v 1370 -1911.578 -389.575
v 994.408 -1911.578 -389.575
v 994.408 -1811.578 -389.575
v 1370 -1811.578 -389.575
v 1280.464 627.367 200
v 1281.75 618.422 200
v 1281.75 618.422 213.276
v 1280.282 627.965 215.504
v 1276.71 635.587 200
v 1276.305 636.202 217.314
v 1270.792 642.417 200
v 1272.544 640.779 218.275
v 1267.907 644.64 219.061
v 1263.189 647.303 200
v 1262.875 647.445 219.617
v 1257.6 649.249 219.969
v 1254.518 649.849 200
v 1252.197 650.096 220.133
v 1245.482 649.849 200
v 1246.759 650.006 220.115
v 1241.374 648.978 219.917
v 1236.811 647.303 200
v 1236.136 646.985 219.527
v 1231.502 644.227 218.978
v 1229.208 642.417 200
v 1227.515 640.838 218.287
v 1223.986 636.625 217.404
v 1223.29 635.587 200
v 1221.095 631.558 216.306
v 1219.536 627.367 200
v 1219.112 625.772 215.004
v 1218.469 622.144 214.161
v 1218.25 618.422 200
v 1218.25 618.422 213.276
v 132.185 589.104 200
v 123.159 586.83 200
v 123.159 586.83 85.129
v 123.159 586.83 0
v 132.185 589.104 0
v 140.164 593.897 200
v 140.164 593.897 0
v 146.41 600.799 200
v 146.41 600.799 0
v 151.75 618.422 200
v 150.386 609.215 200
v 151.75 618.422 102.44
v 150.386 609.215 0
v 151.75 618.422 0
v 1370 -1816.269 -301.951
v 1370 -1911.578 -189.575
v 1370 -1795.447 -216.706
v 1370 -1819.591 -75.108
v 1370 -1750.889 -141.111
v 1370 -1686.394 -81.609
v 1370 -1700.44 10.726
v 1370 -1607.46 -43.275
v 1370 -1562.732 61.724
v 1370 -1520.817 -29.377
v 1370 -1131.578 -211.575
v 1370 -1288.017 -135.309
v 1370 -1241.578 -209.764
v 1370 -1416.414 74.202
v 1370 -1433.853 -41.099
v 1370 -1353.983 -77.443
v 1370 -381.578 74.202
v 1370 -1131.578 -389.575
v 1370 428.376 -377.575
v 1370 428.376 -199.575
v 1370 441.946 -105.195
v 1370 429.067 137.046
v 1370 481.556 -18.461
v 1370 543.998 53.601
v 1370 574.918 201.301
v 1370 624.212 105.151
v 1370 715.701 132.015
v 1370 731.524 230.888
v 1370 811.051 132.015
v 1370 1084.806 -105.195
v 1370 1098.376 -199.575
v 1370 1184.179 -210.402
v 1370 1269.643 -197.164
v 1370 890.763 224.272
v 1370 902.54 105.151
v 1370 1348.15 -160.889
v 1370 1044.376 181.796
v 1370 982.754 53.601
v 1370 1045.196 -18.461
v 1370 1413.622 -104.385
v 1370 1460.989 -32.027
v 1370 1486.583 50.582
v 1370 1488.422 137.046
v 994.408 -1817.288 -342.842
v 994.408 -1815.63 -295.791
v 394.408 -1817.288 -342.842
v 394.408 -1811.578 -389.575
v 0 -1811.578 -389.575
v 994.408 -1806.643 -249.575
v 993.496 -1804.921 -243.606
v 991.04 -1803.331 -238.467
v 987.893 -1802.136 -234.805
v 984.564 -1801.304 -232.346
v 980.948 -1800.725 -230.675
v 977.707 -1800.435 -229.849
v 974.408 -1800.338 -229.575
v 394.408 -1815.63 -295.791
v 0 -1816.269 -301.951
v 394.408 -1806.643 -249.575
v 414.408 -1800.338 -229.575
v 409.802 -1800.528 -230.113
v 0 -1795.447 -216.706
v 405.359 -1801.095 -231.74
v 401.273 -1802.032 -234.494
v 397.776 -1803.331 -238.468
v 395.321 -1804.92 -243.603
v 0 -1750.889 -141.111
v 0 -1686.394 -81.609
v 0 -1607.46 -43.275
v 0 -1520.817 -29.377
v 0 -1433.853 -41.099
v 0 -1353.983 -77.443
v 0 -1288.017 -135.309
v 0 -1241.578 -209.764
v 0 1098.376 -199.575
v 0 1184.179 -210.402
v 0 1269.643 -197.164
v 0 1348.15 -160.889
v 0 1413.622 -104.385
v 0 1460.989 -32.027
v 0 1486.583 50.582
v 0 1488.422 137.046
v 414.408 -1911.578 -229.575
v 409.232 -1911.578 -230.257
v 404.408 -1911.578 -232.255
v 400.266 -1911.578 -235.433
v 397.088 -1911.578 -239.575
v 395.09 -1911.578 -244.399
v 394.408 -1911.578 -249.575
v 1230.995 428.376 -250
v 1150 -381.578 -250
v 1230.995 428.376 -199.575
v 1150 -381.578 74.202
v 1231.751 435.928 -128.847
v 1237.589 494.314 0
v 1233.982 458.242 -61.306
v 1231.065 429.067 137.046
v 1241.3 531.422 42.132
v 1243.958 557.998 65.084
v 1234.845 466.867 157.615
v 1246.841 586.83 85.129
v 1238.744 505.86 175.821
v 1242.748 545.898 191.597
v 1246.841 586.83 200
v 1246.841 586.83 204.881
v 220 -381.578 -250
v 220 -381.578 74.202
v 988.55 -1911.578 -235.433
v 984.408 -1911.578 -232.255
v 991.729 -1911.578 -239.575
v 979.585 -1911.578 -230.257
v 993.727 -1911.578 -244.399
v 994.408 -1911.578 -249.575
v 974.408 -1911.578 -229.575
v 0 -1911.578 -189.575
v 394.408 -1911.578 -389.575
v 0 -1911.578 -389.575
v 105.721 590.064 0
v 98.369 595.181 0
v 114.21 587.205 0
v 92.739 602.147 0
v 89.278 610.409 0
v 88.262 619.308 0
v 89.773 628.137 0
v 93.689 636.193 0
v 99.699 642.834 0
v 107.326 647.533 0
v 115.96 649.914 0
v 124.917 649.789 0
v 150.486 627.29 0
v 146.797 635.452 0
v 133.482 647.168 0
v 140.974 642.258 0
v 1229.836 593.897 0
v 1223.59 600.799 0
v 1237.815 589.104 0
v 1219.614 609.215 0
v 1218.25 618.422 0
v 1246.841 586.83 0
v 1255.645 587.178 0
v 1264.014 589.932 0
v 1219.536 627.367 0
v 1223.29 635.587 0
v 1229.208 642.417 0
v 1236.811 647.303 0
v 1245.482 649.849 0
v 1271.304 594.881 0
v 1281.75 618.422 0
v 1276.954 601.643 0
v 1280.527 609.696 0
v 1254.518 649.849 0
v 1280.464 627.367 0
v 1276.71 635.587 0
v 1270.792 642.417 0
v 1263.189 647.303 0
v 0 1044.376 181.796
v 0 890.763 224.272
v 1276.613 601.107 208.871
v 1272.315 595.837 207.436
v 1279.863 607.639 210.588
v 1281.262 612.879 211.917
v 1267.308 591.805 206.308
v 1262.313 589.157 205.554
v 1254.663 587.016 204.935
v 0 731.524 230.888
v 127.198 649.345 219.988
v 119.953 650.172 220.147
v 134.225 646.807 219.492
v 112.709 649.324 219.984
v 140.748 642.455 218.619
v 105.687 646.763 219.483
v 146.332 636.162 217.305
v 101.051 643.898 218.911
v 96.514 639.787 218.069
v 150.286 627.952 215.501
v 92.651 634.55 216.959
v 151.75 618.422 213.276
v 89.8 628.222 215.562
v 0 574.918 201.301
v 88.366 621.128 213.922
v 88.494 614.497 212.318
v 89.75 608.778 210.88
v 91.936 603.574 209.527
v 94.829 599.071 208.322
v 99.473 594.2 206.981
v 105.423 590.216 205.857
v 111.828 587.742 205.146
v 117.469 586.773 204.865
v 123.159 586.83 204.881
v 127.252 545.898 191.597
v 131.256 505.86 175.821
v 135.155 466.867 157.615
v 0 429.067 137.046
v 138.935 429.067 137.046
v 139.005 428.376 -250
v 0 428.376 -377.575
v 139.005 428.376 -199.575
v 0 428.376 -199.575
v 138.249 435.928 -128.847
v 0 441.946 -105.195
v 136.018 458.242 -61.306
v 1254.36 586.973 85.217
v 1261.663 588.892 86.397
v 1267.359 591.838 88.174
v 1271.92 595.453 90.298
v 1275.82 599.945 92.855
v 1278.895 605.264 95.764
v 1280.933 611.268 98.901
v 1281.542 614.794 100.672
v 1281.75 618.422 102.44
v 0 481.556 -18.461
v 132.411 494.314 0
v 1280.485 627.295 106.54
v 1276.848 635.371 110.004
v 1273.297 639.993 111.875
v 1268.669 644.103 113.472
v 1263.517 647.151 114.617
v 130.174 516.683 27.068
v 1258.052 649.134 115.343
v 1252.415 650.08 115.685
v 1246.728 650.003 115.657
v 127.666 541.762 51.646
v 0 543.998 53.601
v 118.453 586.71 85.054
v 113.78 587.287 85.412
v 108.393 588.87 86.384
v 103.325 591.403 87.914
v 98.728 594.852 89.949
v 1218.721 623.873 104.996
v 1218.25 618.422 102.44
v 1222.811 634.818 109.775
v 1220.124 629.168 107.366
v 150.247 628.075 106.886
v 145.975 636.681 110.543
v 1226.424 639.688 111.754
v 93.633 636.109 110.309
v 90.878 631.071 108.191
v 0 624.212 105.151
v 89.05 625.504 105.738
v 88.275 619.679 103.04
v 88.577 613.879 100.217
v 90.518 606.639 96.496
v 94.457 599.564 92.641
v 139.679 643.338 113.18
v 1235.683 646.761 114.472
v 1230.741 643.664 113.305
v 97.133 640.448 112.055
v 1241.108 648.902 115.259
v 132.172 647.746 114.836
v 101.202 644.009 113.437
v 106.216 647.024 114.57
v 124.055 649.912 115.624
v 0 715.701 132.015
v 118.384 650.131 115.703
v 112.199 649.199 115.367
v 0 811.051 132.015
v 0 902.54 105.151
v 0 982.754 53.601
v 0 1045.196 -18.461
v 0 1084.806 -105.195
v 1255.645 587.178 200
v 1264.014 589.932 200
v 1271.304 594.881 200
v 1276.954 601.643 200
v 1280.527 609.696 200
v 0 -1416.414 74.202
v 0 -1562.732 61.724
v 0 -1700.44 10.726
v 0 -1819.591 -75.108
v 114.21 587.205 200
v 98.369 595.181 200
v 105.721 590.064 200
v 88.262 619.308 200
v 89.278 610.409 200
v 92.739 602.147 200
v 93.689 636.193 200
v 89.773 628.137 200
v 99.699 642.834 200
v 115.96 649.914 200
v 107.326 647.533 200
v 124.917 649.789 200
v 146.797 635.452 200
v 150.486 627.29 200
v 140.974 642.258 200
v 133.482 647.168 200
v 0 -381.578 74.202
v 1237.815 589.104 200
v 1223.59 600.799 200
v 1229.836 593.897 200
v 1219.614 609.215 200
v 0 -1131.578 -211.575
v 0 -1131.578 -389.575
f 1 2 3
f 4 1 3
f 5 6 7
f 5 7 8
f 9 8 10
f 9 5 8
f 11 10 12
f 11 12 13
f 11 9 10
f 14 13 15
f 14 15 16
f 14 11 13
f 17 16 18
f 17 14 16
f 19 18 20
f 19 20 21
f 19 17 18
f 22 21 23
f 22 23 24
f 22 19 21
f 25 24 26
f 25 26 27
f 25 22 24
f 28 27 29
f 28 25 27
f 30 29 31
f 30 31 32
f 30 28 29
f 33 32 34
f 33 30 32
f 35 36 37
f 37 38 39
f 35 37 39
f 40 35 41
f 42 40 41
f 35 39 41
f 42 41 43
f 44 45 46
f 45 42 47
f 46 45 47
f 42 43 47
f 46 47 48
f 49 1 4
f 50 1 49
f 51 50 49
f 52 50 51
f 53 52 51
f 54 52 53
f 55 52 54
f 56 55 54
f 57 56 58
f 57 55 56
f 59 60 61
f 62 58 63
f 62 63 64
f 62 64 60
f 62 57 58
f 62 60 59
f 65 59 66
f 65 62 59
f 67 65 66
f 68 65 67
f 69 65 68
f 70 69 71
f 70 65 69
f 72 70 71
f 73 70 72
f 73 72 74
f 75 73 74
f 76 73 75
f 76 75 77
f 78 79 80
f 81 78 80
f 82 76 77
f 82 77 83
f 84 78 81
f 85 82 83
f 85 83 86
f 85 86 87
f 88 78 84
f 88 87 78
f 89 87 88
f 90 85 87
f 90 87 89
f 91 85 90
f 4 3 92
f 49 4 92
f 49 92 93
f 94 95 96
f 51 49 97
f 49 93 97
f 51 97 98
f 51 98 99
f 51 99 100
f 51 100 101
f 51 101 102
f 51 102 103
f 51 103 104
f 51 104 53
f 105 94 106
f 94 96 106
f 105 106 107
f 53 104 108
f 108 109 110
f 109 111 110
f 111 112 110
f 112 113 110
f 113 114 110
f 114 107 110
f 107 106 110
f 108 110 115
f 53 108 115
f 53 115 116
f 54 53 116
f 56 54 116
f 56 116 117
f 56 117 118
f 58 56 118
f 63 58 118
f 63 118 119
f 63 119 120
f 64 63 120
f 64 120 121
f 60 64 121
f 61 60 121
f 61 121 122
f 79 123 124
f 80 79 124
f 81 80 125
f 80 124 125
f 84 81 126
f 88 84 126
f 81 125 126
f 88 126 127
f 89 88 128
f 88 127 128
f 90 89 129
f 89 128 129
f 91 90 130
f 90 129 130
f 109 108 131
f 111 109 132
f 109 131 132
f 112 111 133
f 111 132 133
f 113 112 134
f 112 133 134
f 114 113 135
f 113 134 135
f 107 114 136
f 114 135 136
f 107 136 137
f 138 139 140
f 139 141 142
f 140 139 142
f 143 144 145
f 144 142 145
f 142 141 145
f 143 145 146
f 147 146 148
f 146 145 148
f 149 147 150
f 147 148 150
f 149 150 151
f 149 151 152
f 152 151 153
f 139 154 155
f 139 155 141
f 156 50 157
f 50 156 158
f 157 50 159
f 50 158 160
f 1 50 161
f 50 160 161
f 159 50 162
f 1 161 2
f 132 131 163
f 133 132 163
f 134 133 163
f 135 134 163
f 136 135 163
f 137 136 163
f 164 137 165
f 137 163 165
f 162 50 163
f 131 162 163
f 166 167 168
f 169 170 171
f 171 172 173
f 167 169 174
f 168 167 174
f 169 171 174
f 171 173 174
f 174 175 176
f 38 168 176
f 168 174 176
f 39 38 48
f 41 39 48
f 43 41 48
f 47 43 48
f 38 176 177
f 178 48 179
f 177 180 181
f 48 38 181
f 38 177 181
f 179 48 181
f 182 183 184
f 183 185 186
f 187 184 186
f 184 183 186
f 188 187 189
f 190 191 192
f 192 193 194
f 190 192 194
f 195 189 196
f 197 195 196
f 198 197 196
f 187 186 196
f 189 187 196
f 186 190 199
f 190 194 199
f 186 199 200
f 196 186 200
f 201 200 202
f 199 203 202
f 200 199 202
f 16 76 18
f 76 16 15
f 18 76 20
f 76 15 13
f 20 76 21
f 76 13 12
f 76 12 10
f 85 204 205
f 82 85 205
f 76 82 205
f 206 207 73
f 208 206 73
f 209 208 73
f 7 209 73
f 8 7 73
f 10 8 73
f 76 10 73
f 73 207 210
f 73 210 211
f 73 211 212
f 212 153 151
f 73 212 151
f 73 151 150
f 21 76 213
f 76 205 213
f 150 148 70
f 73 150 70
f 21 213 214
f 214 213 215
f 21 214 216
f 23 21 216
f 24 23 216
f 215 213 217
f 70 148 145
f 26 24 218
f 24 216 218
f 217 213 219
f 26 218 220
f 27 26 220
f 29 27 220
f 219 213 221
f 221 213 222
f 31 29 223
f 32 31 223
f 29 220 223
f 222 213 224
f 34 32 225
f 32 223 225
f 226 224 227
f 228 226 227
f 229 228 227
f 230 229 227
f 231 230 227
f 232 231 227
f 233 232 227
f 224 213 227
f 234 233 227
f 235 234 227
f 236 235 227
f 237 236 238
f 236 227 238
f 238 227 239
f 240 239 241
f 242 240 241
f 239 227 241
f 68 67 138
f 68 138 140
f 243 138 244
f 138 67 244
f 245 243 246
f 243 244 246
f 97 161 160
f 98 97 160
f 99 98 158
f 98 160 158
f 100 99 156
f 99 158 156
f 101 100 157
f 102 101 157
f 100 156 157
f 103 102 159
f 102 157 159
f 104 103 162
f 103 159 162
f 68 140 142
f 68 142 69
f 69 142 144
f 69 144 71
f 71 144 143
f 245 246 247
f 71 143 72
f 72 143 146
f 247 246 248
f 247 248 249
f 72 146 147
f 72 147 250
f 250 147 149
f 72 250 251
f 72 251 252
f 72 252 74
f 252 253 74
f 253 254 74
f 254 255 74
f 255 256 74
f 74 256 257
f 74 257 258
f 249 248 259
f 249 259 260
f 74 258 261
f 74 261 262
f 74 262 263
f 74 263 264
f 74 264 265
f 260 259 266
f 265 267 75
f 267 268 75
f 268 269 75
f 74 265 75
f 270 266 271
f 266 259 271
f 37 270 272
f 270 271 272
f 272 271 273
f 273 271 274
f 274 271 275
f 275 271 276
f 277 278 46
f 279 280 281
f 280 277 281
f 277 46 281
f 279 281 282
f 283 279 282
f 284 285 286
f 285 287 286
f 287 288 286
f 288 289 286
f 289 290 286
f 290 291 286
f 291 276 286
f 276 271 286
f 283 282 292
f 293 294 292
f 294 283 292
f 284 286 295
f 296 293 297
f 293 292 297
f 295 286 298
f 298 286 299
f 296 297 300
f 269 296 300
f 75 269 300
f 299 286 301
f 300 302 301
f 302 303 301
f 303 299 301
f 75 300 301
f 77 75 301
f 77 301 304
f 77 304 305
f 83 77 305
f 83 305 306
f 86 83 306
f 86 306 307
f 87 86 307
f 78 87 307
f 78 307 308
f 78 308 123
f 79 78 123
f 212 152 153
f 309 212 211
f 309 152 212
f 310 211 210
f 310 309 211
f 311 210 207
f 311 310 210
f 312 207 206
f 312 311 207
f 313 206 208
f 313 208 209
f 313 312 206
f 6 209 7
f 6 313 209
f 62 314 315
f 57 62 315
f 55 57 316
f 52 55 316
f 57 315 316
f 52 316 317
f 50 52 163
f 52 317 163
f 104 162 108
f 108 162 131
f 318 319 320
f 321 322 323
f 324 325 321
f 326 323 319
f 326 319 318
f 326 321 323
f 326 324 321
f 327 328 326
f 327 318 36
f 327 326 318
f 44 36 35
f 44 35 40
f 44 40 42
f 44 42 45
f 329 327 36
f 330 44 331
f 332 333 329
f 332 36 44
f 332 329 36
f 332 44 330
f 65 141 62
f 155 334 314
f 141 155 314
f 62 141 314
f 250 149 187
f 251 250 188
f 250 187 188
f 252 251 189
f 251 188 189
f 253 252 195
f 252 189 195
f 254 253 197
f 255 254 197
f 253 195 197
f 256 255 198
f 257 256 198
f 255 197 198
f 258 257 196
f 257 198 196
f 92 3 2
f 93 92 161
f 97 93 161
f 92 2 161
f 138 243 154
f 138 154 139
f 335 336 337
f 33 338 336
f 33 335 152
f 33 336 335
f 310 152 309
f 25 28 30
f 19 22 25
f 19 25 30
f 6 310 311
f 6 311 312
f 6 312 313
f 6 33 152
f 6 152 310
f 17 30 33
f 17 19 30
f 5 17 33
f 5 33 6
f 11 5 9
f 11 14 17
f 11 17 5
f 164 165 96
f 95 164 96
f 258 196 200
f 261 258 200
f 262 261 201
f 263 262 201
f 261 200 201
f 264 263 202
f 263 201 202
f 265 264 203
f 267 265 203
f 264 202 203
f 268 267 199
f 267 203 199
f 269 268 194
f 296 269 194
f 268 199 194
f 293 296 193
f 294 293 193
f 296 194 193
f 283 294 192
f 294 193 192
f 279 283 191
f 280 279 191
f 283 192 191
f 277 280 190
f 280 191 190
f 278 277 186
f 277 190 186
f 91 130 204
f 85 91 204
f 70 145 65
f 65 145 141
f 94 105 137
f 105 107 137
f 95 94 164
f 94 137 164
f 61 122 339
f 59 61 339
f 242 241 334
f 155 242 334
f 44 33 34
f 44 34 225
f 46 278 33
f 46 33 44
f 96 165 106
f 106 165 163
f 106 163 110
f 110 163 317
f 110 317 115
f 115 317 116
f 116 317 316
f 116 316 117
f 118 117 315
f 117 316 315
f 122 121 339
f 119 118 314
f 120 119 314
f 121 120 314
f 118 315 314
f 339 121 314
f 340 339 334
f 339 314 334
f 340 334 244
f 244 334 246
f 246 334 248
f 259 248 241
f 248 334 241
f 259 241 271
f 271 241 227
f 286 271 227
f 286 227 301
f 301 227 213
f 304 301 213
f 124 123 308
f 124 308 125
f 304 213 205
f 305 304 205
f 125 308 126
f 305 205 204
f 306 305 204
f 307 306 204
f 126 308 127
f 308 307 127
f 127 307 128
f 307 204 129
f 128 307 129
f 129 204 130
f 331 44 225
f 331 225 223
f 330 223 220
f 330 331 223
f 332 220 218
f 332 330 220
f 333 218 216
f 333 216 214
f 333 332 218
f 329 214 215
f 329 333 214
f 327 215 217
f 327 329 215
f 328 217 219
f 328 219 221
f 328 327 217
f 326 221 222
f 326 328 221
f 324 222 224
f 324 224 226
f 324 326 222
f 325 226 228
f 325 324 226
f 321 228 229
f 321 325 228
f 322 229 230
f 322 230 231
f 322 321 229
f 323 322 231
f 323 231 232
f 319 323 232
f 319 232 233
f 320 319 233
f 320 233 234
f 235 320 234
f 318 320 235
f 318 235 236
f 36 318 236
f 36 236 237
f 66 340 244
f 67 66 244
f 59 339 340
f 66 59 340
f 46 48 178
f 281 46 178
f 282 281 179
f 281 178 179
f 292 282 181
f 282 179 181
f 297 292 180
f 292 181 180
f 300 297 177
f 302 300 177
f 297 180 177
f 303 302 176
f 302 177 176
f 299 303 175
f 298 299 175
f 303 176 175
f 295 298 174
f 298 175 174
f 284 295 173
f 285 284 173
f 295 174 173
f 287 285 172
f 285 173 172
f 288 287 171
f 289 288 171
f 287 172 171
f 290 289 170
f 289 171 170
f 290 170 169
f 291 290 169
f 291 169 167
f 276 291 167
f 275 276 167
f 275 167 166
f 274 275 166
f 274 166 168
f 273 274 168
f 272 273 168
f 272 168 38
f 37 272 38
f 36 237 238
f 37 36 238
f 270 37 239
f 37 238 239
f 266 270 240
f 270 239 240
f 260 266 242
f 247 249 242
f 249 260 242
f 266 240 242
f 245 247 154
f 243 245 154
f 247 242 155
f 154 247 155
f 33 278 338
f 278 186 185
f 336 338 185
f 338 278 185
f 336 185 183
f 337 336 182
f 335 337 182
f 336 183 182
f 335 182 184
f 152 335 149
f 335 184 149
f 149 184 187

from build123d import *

# Parameters (mm, degrees)
F1_DEPTH      = 1370
F3_DEPTH      = 350
F3_DEPTH_BACK = 250
F5_DEPTH      = 500
F6_DEPTH      = 200


with BuildPart() as f1:
    # F0 (on Right) → F1 (new body)
    with BuildSketch(Plane.YZ):
        with BuildLine():
            Line((-1911.5778493881, -189.5754868984), (-1911.5778493881, -389.5754868984))
            Line((-1911.5778493881, -389.5754868984), (-1811.5778493881, -389.5754868984))
            ThreePointArc((-1811.5778493881, -389.5754868984), (-1607.4597576935, -43.2750382885), (-1241.5778493881, -209.7641527653))
            Line((-1241.5778493881, -209.7641527653), (-1131.5778493881, -211.5754868984))
            Line((-1131.5778493881, -211.5754868984), (428.375996083, -199.5754868984))
            ThreePointArc((428.375996083, -199.5754868984), (763.375996083, 135.4245131016), (1098.375996083, -199.5754868984))
            ThreePointArc((1098.375996083, -199.5754868984), (1382.8614905548, -134.9256651401), (1488.4221506119, 137.0459198952))
            Line((1488.4221506119, 137.0459198952), (1044.3756580353, 181.7956119776))
            ThreePointArc((1044.3756580353, 181.7956119776), (731.5239625306, 230.887727856), (429.0674626827, 137.0459198952))
            Line((429.0674626827, 137.0459198952), (-381.5778493881, 74.202198957))
            Line((-381.5778493881, 74.202198957), (-1416.4143651724, 74.202198957))
            ThreePointArc((-1416.4143651724, 74.202198957), (-1700.4400128393, 10.7258572479), (-1911.5778493881, -189.5754868984))
        make_face()
        Polygon((428.375996083, -199.5754868984), (-1131.5778493881, -211.5754868984), (-1131.5778493881, -389.5754868984), (428.375996083, -377.5754868984), align=None)
    extrude(amount=F1_DEPTH)

    # F2 (on Top) → F3 (cut, two sides)
    with BuildSketch(Plane.XY) as f3_sk:
        with BuildLine():
            Line((123.1592430789, 586.8297198227), (220, -381.5778493881))
            Line((220, -381.5778493881), (1150, -381.5778493881))
            Line((1150, -381.5778493881), (1246.8407569211, 586.8297198227))
            ThreePointArc((1246.8407569211, 586.8297198227), (1226.4588820597, 597.1177316777), (1218.25, 618.4221506119))
            Line((1218.25, 618.4221506119), (151.75, 618.4221506119))
            ThreePointArc((151.75, 618.4221506119), (143.5411179403, 597.1177316777), (123.1592430789, 586.8297198227))
        make_face()
        with BuildLine():
            ThreePointArc((151.75, 618.4221506119), (96.4588820597, 639.726569546), (123.1592430789, 586.8297198227))
            Line((123.1592430789, 586.8297198227), (120, 618.4221506119))
            Line((120, 618.4221506119), (151.75, 618.4221506119))
        make_face()
        with BuildLine():
            Line((120, 618.4221506119), (123.1592430789, 586.8297198227))
            ThreePointArc((123.1592430789, 586.8297198227), (143.5411179403, 597.1177316777), (151.75, 618.4221506119))
            Line((151.75, 618.4221506119), (120, 618.4221506119))
        make_face()
        with BuildLine():
            ThreePointArc((1218.25, 618.4221506119), (1226.4588820597, 597.1177316777), (1246.8407569211, 586.8297198227))
            Line((1246.8407569211, 586.8297198227), (1250, 618.4221506119))
            Line((1250, 618.4221506119), (1218.25, 618.4221506119))
        make_face()
        with BuildLine():
            Line((1250, 618.4221506119), (1246.8407569211, 586.8297198227))
            ThreePointArc((1246.8407569211, 586.8297198227), (1271.3044189342, 594.8810326716), (1281.75, 618.4221506119))
            ThreePointArc((1281.75, 618.4221506119), (1250, 650.1721506119), (1218.25, 618.4221506119))
            Line((1218.25, 618.4221506119), (1250, 618.4221506119))
        make_face()
    extrude(amount=F3_DEPTH, mode=Mode.SUBTRACT)
    extrude(f3_sk.sketch, amount=-F3_DEPTH_BACK, mode=Mode.SUBTRACT)

    # F4 (on face) → F5 (cut)
    with BuildSketch(Plane.XZ.offset(1911.5778493881)):
        with BuildLine():
            Line((394.4081366062, -249.5754868984), (394.4081366062, -389.5754868984))
            Line((394.4081366062, -389.5754868984), (994.4081366062, -389.5754868984))
            Line((994.4081366062, -389.5754868984), (994.4081366062, -249.5754868984))
            ThreePointArc((994.4081366062, -249.5754868984), (988.5502722299, -235.4333512747), (974.4081366062, -229.5754868984))
            Line((974.4081366062, -229.5754868984), (414.4081366062, -229.5754868984))
            ThreePointArc((414.4081366062, -229.5754868984), (400.2660009825, -235.4333512747), (394.4081366062, -249.5754868984))
        make_face()
    extrude(amount=-F5_DEPTH, mode=Mode.SUBTRACT)

    # F2 (on Top) → F6 (join)
    with BuildSketch(Plane.XY):
        with BuildLine():
            ThreePointArc((151.75, 618.4221506119), (96.4588820597, 639.726569546), (123.1592430789, 586.8297198227))
            Line((123.1592430789, 586.8297198227), (120, 618.4221506119))
            Line((120, 618.4221506119), (151.75, 618.4221506119))
        make_face()
        with BuildLine():
            Line((120, 618.4221506119), (123.1592430789, 586.8297198227))
            ThreePointArc((123.1592430789, 586.8297198227), (143.5411179403, 597.1177316777), (151.75, 618.4221506119))
            Line((151.75, 618.4221506119), (120, 618.4221506119))
        make_face()
        with BuildLine():
            ThreePointArc((1218.25, 618.4221506119), (1226.4588820597, 597.1177316777), (1246.8407569211, 586.8297198227))
            Line((1246.8407569211, 586.8297198227), (1250, 618.4221506119))
            Line((1250, 618.4221506119), (1218.25, 618.4221506119))
        make_face()
        with BuildLine():
            Line((1250, 618.4221506119), (1246.8407569211, 586.8297198227))
            ThreePointArc((1246.8407569211, 586.8297198227), (1271.3044189342, 594.8810326716), (1281.75, 618.4221506119))
            ThreePointArc((1281.75, 618.4221506119), (1250, 650.1721506119), (1218.25, 618.4221506119))
            Line((1218.25, 618.4221506119), (1250, 618.4221506119))
        make_face()
    extrude(amount=F6_DEPTH)


solid = f1.part
